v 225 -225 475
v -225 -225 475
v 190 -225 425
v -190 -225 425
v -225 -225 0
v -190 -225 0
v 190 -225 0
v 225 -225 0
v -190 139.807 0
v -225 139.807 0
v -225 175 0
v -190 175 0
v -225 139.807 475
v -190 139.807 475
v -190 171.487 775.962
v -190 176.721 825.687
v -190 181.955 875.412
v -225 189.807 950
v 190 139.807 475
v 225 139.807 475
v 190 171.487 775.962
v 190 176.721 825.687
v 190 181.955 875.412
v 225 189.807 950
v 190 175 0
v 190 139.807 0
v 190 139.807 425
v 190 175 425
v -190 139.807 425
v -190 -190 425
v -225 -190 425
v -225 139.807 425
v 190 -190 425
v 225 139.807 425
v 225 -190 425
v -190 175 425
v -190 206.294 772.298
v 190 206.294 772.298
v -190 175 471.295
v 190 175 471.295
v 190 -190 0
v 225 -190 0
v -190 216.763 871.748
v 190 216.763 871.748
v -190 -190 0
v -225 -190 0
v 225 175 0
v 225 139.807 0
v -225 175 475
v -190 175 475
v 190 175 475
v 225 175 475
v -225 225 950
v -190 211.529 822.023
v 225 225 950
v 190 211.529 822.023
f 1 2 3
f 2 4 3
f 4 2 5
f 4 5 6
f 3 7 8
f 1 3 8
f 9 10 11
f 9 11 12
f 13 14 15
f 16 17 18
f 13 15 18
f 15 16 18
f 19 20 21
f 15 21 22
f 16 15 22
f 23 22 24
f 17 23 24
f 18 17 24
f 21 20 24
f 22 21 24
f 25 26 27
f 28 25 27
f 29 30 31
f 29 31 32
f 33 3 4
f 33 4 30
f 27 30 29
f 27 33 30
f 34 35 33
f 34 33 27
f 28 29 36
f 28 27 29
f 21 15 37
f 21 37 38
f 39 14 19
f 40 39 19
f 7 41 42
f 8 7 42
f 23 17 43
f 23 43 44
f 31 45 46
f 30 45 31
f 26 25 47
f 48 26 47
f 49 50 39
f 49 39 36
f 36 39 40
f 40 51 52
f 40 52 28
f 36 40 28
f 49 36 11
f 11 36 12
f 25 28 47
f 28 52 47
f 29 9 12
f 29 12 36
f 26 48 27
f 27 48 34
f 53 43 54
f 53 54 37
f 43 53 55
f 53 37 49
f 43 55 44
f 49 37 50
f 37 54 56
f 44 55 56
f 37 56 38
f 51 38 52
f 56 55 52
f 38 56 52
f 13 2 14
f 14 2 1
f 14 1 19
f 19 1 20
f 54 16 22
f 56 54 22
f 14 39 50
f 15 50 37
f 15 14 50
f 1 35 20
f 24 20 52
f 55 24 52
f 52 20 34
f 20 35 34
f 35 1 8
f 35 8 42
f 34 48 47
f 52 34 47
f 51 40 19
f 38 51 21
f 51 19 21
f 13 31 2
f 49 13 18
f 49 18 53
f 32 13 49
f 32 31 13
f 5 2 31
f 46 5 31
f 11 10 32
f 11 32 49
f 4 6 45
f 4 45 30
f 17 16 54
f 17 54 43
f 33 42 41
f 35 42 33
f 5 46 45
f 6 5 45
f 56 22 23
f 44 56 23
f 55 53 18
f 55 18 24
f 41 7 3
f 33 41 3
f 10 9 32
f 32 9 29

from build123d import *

# Parameters (mm, degrees)
F0_W     = 450
F0_H     = 450
F1_DEPTH = 950
F2_W     = 50
F2_H     = 50
F2_W_2   = 329.8066283627
F2_H_2   = 425
F3_DEPTH = 450.001
F4_W     = 380
F4_H     = 425
F5_DEPTH = 450.001
F6_W     = 380
F6_H     = 302.6243293636
F6_H_2   = 50
F7_DEPTH = 134.4515452921


with BuildPart() as f1:
    # F0 (on Top) → F1 (new body)
    with BuildSketch(Plane.XY):
        Rectangle(F0_W, F0_H)
    extrude(amount=F1_DEPTH)

    # F2 (on face) → F3 (cut, through all)
    with BuildSketch(Plane.YZ.offset(225)):
        with Locations((200, 450)):
            Rectangle(F2_W, F2_H)
        Polygon((-225, 950), (-225, 475), (139.8066283627, 475), (189.8066283627, 950), align=None)
        Polygon((225, 950), (175, 475), (225, 475), align=None)
        with Locations((-25.0966858187, 212.5)):
            Rectangle(F2_W_2, F2_H_2)
        with Locations((200, 212.5)):
            Rectangle(F2_W, F2_H_2)
    extrude(amount=-F3_DEPTH, mode=Mode.SUBTRACT)

    # F4 (on face) → F5 (cut, through all)
    with BuildSketch(Plane.XZ.offset(225)):
        with Locations((0, 212.5)):
            Rectangle(F4_W, F4_H)
    extrude(amount=-F5_DEPTH, mode=Mode.SUBTRACT)

    # F6 (on face) → F7 (cut, through all)
    with BuildSketch(Plane(origin=(0, 88.8224461341, -9.349731172), x_dir=(1, 0, 0), z_dir=(0, -0.9945054529, 0.1046847845))):
        with Locations((0, 638.3378815838)):
            Rectangle(F6_W, F6_H)
        with Locations((0, 864.6500462656)):
            Rectangle(F6_W, F6_H_2)
    extrude(amount=-F7_DEPTH, mode=Mode.SUBTRACT)


solid = f1.part
